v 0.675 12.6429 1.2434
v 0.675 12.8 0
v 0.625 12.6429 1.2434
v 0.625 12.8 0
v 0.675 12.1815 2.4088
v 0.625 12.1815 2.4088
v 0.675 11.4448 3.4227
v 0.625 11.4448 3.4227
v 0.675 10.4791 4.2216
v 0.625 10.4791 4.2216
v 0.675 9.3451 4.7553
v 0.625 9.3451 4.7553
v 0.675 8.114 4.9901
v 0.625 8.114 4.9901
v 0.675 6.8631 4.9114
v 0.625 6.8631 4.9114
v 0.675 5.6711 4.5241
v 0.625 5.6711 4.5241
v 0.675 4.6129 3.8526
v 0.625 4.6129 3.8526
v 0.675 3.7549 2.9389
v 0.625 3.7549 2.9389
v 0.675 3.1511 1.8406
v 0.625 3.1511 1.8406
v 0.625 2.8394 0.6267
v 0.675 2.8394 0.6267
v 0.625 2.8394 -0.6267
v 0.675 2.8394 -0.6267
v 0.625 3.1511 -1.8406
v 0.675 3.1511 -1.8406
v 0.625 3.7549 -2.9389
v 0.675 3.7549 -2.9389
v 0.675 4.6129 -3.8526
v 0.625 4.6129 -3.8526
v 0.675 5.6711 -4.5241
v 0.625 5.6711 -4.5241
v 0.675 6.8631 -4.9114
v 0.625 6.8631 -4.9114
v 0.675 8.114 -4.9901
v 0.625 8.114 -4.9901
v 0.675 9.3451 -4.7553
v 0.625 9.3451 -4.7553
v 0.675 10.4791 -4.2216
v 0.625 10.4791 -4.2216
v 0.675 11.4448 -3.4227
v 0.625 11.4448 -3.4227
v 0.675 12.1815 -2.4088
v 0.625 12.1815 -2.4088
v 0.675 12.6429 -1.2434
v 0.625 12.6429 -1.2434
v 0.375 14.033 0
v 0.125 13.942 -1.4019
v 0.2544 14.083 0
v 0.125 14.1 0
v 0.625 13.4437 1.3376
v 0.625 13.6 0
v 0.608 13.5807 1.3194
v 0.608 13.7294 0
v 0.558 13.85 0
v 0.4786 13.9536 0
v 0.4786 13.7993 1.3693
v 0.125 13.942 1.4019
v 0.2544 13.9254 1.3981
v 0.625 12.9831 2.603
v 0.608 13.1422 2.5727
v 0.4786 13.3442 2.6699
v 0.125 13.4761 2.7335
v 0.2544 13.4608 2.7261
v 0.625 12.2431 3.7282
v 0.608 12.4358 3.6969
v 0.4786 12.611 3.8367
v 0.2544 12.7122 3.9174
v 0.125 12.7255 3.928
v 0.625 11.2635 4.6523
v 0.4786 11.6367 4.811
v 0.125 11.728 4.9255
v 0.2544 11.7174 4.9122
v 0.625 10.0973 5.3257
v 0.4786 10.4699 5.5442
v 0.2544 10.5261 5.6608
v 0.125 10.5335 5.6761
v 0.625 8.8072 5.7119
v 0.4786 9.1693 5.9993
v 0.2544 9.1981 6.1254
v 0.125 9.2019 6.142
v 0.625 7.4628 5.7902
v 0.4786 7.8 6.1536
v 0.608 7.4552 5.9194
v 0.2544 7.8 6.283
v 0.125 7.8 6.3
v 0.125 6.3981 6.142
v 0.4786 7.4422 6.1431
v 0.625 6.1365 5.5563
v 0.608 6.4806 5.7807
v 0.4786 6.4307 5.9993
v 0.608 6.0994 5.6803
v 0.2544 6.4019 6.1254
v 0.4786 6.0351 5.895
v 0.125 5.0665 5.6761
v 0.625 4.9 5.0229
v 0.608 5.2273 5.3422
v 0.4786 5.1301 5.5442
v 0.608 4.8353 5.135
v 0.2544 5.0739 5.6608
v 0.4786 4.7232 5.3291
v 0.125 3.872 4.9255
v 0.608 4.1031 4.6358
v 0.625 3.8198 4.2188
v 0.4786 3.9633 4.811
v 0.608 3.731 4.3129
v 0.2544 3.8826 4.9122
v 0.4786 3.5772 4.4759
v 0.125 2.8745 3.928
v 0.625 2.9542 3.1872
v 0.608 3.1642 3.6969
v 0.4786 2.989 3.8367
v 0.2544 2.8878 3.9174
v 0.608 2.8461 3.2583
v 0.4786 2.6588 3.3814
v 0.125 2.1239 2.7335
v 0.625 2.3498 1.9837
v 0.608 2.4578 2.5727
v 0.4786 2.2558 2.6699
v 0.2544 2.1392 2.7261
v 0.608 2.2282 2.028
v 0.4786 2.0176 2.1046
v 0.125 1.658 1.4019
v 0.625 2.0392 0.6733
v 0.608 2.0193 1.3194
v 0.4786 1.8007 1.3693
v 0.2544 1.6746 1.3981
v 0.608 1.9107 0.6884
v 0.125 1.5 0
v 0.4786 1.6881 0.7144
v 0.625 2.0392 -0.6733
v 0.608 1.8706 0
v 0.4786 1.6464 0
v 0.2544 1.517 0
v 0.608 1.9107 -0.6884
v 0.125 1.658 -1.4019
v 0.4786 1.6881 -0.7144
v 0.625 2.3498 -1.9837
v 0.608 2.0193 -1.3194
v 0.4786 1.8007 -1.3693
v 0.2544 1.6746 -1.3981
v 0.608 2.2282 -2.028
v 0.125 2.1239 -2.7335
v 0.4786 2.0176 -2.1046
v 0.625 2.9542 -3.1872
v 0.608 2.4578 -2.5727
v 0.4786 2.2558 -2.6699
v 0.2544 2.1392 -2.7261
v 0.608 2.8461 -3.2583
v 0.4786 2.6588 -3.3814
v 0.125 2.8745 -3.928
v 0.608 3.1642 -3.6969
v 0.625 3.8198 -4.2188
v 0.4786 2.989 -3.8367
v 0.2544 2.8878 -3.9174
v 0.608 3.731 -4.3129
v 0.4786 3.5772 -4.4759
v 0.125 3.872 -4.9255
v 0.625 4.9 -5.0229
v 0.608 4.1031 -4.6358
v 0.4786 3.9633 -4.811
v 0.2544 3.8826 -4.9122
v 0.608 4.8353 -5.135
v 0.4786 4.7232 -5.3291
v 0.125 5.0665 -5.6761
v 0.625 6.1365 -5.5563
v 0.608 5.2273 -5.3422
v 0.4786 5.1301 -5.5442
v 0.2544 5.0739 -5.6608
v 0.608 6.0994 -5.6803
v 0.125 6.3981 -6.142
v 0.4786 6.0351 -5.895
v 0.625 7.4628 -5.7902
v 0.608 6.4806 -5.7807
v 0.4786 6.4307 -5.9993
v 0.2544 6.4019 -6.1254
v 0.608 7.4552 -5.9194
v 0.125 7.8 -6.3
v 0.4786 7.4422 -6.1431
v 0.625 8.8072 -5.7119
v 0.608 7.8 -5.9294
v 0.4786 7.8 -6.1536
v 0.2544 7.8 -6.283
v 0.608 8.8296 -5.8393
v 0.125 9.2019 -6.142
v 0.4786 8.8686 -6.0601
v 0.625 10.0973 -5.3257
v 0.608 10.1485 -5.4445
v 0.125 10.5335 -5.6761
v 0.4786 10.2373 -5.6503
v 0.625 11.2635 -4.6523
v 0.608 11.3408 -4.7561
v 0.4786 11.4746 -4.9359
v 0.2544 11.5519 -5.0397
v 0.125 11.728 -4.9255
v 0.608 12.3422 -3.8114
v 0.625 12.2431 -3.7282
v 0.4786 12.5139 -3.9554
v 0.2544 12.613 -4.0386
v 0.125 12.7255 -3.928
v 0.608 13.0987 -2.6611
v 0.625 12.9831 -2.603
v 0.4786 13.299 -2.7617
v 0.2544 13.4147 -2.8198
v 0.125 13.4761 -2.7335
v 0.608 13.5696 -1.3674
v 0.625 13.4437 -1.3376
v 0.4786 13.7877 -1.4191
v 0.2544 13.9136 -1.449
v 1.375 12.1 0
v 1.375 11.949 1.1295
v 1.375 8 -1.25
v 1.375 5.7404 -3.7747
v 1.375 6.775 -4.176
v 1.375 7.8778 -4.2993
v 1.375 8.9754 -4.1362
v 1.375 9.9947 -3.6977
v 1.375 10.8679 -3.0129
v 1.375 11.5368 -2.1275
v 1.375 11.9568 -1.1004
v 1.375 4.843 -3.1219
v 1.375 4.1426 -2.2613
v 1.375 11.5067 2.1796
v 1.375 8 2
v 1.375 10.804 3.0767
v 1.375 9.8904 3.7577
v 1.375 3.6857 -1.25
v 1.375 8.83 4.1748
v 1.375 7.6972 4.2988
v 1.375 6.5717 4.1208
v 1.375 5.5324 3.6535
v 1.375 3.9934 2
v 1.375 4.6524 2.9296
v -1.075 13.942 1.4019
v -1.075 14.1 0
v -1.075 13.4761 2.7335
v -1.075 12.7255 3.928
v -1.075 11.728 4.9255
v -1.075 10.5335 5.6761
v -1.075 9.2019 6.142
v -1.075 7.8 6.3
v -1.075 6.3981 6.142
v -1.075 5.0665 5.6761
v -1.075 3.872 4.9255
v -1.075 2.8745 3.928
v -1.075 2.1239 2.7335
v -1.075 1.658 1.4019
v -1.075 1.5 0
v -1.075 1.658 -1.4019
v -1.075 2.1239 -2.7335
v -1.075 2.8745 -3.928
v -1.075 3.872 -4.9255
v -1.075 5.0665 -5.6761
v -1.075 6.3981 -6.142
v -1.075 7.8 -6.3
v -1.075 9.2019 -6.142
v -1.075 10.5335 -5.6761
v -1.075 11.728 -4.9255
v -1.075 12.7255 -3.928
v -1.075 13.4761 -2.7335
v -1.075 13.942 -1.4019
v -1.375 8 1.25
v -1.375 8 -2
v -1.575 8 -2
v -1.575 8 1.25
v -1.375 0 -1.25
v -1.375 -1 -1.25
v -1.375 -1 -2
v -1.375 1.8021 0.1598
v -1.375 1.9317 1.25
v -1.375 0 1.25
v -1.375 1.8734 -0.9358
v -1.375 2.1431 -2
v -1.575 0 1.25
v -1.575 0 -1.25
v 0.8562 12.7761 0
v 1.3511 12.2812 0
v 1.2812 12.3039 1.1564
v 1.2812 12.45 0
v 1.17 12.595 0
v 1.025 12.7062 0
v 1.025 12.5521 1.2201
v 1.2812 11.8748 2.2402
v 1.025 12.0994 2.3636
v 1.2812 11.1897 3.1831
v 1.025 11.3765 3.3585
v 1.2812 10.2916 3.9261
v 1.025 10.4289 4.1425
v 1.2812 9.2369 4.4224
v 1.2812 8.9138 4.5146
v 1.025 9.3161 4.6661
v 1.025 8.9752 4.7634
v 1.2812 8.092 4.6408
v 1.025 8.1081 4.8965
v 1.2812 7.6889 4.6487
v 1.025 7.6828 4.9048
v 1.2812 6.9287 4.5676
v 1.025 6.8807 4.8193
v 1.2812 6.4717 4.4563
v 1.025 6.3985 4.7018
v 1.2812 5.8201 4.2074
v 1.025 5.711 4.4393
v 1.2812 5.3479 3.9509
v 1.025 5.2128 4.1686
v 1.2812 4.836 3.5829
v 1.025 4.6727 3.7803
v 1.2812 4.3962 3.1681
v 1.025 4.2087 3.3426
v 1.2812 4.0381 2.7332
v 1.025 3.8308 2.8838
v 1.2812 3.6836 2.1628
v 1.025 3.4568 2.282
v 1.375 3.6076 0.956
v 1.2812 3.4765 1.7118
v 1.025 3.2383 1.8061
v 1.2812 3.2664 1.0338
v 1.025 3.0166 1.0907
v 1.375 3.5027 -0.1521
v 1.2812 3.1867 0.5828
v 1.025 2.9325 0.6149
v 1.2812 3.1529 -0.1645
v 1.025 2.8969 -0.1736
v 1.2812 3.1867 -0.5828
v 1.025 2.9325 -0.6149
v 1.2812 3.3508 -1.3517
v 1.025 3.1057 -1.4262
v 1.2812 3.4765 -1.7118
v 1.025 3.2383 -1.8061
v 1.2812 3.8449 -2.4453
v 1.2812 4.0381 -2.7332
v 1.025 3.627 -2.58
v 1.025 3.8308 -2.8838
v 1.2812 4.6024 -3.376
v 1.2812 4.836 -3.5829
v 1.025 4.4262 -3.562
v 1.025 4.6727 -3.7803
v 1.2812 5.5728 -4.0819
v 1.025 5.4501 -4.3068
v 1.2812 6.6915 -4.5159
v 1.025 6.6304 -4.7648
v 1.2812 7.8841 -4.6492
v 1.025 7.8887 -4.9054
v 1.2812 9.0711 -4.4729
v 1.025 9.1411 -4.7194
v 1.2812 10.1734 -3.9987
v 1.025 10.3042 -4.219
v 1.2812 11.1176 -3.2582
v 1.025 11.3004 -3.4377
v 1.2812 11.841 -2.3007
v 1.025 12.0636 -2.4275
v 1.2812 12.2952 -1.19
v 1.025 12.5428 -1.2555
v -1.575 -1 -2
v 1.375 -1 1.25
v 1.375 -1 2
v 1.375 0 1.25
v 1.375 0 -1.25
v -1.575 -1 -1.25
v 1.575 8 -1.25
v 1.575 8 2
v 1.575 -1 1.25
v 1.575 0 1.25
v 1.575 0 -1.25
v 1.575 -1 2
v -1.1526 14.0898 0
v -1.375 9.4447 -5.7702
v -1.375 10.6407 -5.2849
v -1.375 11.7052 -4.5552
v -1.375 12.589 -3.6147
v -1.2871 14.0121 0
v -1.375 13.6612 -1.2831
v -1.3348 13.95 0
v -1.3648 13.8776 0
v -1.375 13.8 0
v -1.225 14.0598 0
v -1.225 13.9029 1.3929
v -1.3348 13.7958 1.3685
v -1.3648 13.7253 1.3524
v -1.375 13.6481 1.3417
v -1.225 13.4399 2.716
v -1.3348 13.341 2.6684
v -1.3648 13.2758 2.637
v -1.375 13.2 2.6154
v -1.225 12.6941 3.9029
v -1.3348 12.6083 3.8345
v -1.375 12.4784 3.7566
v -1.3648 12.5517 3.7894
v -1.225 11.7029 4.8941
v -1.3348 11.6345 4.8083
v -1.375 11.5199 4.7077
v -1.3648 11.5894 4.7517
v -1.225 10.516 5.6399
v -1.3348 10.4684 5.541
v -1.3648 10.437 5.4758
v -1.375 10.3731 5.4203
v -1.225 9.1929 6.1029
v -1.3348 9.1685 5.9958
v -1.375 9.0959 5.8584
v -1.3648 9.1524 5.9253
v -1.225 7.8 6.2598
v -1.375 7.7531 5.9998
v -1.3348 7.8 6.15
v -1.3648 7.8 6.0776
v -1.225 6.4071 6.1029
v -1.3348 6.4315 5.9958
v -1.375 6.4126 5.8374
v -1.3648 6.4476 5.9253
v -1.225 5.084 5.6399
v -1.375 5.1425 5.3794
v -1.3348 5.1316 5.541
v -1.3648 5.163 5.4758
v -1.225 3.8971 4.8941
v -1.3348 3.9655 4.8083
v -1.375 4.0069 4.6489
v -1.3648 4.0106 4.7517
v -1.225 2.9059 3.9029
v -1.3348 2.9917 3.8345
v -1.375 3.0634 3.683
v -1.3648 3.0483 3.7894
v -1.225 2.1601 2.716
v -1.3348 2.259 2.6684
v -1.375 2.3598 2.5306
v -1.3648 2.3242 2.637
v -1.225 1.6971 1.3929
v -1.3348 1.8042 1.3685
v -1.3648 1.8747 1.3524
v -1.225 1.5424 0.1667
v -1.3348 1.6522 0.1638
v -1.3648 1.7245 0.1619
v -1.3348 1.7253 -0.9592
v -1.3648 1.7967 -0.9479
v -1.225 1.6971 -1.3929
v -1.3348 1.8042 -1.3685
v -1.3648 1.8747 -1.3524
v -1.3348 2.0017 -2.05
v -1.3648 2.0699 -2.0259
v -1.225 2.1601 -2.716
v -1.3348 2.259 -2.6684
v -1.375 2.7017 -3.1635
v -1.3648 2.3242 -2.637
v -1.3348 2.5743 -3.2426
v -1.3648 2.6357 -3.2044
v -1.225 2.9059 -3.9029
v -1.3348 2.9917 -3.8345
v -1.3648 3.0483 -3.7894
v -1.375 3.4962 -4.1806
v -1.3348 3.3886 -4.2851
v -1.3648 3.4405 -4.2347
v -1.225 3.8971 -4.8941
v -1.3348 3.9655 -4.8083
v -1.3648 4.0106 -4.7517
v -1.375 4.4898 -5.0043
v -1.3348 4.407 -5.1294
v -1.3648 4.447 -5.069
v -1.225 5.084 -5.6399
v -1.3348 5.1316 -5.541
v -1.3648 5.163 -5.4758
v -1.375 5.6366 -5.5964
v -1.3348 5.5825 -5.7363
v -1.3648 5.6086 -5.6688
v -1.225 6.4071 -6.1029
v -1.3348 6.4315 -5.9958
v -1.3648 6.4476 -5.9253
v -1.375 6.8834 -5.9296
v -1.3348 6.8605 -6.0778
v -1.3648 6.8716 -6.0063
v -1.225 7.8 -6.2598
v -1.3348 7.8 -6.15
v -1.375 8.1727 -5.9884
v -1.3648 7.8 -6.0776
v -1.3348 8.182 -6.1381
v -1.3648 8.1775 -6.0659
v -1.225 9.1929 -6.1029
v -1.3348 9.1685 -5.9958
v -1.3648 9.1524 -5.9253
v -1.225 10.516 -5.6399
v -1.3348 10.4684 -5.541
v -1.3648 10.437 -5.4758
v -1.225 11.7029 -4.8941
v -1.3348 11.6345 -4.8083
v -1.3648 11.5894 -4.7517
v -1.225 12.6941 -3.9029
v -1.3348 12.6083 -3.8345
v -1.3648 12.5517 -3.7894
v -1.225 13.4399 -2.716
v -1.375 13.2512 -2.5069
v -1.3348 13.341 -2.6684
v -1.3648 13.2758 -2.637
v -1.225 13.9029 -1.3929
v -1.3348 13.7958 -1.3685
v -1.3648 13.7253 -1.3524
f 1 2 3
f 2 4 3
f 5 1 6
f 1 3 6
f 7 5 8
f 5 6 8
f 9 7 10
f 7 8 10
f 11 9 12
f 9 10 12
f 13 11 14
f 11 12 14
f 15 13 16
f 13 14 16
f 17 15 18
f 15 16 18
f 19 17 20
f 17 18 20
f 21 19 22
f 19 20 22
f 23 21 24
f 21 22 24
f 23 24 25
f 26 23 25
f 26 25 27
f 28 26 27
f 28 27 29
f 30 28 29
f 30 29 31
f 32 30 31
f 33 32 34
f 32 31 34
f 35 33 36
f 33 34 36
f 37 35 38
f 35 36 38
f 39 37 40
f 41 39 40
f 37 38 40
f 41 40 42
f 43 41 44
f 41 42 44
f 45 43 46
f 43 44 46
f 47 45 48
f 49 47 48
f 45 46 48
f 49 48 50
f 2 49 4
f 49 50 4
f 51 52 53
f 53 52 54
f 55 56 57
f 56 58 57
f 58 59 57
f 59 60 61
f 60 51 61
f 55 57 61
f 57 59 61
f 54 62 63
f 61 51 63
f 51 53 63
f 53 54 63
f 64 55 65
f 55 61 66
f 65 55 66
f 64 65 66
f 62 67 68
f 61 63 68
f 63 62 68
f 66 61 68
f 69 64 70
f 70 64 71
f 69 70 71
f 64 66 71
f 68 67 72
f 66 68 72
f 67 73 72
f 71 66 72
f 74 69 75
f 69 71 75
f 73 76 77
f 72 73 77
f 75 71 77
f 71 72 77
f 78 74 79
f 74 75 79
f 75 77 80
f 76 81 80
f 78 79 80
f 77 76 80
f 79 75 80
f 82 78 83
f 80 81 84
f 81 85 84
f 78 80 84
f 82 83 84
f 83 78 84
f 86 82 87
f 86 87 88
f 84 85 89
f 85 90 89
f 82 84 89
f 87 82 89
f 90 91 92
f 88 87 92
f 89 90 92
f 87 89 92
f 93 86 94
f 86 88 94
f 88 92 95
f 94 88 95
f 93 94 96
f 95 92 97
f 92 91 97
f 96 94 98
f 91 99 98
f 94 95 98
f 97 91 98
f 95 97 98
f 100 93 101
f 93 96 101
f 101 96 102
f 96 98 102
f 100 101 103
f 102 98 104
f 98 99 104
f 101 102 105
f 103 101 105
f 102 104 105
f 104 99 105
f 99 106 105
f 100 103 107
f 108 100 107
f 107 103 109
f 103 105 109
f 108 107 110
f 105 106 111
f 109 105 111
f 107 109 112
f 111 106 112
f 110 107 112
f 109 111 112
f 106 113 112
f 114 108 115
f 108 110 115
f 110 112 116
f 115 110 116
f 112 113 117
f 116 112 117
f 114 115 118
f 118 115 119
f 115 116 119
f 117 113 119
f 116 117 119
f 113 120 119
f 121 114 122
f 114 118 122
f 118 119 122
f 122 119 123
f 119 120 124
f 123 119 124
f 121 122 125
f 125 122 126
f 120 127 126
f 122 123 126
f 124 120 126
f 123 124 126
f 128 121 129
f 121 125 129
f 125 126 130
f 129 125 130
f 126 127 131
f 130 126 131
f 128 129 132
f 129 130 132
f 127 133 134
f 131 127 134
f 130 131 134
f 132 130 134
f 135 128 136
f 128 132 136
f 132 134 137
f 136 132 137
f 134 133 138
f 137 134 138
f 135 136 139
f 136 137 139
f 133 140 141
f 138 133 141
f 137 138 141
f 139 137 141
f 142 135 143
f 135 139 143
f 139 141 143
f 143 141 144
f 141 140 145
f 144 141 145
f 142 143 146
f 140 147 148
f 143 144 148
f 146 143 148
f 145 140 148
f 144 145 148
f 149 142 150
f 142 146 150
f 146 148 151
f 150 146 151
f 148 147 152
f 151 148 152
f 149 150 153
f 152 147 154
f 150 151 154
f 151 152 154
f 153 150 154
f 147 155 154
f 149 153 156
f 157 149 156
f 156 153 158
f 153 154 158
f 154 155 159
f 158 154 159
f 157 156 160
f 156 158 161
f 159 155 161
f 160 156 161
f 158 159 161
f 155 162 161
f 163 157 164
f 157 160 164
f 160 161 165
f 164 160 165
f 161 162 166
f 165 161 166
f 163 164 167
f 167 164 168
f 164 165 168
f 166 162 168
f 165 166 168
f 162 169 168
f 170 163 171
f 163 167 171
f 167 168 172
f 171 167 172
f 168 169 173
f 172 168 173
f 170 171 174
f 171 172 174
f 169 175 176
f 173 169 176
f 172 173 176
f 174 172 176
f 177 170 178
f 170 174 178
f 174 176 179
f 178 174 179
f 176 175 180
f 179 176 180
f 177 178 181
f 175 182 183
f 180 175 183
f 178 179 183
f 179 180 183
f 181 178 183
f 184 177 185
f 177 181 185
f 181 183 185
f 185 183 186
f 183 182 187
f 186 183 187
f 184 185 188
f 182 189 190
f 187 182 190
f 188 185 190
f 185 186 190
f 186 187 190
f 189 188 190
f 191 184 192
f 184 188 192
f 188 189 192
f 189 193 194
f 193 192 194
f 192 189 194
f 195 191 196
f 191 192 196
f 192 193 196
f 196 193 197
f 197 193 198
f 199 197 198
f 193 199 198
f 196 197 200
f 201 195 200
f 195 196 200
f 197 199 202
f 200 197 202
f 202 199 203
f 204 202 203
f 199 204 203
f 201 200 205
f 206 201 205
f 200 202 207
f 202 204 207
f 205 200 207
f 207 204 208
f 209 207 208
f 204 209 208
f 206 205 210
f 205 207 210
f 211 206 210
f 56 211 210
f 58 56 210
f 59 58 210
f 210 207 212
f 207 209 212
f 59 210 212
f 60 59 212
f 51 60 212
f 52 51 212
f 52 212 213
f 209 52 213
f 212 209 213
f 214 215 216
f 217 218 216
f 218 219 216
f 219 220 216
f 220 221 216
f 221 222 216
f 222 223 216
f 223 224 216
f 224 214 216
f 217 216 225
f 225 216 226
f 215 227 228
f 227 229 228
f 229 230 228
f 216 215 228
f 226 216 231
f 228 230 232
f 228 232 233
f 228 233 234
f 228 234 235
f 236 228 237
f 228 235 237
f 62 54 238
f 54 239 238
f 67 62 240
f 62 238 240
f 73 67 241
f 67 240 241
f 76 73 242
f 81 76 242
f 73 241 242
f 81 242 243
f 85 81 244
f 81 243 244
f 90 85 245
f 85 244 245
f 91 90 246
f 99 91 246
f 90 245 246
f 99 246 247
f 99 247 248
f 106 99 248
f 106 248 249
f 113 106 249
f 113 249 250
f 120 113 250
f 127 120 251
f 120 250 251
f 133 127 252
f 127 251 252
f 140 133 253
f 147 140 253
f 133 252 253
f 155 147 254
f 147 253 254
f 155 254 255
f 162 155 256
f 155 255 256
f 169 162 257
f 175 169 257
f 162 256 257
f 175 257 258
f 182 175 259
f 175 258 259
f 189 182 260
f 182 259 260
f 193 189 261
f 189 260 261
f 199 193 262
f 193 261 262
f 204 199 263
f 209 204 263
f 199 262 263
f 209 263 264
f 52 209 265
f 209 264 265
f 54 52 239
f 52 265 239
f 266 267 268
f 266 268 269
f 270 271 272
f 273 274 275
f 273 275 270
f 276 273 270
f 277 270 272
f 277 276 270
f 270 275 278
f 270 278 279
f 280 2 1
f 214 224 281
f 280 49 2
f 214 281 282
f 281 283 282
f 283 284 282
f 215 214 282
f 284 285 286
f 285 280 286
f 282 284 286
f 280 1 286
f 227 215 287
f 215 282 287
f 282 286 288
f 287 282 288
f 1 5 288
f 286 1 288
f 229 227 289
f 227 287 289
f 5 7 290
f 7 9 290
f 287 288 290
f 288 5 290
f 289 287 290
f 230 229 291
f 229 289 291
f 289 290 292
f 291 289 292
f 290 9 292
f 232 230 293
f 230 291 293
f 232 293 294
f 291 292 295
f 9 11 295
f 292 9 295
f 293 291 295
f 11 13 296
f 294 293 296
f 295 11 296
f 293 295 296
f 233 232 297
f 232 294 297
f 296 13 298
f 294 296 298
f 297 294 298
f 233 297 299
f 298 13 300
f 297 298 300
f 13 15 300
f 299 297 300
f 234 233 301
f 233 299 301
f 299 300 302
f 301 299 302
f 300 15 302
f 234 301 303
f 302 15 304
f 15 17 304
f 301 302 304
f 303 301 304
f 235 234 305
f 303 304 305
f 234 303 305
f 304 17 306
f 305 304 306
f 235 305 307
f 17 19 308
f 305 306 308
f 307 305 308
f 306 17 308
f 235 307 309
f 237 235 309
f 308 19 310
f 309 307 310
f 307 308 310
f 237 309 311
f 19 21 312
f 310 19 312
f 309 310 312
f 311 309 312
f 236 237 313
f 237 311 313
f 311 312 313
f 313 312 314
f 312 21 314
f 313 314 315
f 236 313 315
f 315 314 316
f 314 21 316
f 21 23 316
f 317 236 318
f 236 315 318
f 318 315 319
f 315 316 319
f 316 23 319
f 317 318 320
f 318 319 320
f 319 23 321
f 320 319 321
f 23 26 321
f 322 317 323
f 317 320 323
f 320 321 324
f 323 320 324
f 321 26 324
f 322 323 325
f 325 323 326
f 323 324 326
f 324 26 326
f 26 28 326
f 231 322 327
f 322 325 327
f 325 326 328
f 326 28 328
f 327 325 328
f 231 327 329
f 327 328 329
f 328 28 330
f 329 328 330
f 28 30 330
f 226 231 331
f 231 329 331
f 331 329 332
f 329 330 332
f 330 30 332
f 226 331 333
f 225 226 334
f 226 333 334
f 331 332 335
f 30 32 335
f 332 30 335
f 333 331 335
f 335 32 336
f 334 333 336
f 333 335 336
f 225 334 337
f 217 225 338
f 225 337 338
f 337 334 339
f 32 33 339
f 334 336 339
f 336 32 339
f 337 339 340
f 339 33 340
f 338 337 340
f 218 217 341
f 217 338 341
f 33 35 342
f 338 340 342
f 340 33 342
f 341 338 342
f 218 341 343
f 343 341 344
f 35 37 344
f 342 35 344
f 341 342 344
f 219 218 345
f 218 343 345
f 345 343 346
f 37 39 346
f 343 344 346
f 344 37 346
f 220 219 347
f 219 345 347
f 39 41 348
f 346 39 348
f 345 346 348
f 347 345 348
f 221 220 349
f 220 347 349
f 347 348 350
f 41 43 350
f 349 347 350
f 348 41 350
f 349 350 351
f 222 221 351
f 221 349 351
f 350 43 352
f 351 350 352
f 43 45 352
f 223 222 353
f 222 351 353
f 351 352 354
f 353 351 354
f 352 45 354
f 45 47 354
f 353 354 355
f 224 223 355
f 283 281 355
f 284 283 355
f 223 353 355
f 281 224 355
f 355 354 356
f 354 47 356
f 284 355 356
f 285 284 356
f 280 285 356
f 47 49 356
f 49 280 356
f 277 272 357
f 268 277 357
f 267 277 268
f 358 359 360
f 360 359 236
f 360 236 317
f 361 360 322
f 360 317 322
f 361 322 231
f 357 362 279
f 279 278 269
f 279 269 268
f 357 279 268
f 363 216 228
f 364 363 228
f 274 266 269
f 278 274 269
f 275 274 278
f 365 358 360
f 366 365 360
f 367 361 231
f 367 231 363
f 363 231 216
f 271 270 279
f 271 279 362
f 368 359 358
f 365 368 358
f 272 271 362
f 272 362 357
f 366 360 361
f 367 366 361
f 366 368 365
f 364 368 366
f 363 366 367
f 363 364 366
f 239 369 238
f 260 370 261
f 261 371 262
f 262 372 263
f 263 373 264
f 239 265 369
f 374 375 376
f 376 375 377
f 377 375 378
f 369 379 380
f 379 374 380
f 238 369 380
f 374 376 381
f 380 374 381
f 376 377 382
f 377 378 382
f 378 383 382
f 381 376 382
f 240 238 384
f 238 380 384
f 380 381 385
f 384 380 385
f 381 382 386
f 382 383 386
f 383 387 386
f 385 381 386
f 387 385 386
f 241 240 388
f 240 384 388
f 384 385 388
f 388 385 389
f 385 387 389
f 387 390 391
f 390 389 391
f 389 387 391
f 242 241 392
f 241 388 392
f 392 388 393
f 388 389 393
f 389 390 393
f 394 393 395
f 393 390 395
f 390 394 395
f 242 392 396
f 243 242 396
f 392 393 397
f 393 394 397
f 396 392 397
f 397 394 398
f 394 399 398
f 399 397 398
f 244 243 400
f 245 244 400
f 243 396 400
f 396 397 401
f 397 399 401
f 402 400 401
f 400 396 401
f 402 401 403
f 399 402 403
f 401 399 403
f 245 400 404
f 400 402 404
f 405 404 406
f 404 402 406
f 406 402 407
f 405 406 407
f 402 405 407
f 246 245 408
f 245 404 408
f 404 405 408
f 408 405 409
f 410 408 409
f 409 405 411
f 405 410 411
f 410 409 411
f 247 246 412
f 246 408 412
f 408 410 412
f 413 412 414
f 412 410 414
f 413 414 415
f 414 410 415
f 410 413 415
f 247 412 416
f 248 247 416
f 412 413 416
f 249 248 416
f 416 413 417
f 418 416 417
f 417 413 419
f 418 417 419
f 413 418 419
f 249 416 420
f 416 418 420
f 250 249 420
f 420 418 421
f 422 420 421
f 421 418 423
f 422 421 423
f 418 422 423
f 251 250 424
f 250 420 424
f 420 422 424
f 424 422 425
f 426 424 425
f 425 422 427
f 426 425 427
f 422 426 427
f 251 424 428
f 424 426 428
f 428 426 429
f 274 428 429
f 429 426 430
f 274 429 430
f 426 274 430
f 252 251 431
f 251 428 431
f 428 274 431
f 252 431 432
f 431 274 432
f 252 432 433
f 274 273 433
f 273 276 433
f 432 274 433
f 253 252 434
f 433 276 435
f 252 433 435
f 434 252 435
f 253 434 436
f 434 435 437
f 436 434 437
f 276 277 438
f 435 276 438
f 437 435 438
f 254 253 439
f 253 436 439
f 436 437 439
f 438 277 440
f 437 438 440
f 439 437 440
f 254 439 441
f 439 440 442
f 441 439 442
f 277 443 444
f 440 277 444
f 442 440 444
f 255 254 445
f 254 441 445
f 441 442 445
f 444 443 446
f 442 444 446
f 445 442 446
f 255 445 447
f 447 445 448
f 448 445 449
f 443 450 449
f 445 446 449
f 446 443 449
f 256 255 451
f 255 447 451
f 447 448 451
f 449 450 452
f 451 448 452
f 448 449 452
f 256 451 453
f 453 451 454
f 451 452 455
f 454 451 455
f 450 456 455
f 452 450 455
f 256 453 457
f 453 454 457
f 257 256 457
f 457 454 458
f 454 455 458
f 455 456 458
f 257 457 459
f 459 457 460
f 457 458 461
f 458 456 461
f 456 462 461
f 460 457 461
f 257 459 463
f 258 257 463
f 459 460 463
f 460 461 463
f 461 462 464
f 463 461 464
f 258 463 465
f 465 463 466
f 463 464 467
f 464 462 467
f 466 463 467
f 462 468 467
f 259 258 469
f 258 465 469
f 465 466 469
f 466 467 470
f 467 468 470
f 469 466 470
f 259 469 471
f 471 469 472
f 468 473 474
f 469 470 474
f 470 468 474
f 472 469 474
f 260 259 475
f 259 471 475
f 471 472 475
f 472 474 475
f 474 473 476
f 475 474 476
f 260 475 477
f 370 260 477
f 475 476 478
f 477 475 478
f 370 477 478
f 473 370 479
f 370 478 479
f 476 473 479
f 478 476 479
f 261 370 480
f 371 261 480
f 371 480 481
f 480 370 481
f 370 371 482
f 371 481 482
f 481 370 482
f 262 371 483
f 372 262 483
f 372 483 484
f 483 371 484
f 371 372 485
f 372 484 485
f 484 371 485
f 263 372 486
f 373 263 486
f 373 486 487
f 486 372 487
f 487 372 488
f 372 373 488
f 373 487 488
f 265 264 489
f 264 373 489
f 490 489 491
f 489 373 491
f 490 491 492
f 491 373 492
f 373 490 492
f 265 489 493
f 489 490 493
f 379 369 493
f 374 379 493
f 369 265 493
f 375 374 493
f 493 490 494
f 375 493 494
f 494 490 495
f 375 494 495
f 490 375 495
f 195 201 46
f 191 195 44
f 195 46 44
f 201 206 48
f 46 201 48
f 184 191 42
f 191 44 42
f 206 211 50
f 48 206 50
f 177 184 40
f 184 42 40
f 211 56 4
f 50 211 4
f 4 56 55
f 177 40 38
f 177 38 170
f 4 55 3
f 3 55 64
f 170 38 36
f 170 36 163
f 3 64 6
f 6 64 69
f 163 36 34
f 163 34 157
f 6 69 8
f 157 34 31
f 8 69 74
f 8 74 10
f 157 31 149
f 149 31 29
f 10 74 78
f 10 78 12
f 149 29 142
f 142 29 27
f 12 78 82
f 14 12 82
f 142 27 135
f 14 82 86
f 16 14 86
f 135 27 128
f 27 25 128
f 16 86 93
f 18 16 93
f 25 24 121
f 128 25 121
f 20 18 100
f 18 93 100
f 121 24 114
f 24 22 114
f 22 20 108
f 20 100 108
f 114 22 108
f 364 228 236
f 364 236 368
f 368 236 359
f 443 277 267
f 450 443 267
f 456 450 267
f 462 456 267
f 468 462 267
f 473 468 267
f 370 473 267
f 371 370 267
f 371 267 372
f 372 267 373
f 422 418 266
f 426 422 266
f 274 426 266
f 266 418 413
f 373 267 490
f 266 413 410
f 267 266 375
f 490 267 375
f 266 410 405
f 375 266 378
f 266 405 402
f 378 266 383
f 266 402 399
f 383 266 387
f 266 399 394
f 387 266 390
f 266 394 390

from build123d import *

# Parameters (mm, degrees)
BOSS_EXTRUDE2_DEPTH = 0.2
BOSS_EXTRUDE3_DEPTH = 0.2


with BuildPart() as part:
    # Sketch1 → Revolve1 (revolve)
    with BuildSketch(Plane.XY):
        with BuildLine():
            Line((-1.375, 7.8), (1.375, 7.8))
            Line((1.375, 7.8), (1.375, 12.1))
            ThreePointArc((1.375, 12.1), (1.169974747, 12.594974747), (0.675, 12.8))
            Line((0.675, 12.8), (0.625, 12.8))
            Line((0.625, 12.8), (0.625, 13.6))
            ThreePointArc((0.625, 13.6), (0.478553391, 13.953553391), (0.125, 14.1))
            Line((0.125, 14.1), (-1.075, 14.1))
            ThreePointArc((-1.075, 14.1), (-1.287132034, 14.012132034), (-1.375, 13.8))
            Line((-1.375, 13.8), (-1.375, 7.8))
        make_face()
    revolve(axis=Axis((-11.93322357, 7.8, 0), (1, 0, 0)))

    # Sketch3 → Boss-Extrude2 (add)
    with BuildSketch(Plane(origin=(1.375, 0, 0), x_dir=(0, 0, -1), z_dir=(1, 0, 0))):
        Polygon((-2, 8), (-2, -1), (-1.25, -1), (-1.25, 0), (1.25, 0), (1.25, 8), align=None)
    extrude(amount=BOSS_EXTRUDE2_DEPTH)

    # Sketch5 → Boss-Extrude3 (add)
    with BuildSketch(Plane(origin=(-1.375, 0, -1.375), x_dir=(0, 0, -1), z_dir=(1, 0, 0))):
        Polygon((0.625, -1), (0.625, 8), (-2.625, 8), (-2.625, 0), (-0.125, 0), (-0.125, -1), align=None)
    extrude(amount=-BOSS_EXTRUDE3_DEPTH)


solid = part.part
